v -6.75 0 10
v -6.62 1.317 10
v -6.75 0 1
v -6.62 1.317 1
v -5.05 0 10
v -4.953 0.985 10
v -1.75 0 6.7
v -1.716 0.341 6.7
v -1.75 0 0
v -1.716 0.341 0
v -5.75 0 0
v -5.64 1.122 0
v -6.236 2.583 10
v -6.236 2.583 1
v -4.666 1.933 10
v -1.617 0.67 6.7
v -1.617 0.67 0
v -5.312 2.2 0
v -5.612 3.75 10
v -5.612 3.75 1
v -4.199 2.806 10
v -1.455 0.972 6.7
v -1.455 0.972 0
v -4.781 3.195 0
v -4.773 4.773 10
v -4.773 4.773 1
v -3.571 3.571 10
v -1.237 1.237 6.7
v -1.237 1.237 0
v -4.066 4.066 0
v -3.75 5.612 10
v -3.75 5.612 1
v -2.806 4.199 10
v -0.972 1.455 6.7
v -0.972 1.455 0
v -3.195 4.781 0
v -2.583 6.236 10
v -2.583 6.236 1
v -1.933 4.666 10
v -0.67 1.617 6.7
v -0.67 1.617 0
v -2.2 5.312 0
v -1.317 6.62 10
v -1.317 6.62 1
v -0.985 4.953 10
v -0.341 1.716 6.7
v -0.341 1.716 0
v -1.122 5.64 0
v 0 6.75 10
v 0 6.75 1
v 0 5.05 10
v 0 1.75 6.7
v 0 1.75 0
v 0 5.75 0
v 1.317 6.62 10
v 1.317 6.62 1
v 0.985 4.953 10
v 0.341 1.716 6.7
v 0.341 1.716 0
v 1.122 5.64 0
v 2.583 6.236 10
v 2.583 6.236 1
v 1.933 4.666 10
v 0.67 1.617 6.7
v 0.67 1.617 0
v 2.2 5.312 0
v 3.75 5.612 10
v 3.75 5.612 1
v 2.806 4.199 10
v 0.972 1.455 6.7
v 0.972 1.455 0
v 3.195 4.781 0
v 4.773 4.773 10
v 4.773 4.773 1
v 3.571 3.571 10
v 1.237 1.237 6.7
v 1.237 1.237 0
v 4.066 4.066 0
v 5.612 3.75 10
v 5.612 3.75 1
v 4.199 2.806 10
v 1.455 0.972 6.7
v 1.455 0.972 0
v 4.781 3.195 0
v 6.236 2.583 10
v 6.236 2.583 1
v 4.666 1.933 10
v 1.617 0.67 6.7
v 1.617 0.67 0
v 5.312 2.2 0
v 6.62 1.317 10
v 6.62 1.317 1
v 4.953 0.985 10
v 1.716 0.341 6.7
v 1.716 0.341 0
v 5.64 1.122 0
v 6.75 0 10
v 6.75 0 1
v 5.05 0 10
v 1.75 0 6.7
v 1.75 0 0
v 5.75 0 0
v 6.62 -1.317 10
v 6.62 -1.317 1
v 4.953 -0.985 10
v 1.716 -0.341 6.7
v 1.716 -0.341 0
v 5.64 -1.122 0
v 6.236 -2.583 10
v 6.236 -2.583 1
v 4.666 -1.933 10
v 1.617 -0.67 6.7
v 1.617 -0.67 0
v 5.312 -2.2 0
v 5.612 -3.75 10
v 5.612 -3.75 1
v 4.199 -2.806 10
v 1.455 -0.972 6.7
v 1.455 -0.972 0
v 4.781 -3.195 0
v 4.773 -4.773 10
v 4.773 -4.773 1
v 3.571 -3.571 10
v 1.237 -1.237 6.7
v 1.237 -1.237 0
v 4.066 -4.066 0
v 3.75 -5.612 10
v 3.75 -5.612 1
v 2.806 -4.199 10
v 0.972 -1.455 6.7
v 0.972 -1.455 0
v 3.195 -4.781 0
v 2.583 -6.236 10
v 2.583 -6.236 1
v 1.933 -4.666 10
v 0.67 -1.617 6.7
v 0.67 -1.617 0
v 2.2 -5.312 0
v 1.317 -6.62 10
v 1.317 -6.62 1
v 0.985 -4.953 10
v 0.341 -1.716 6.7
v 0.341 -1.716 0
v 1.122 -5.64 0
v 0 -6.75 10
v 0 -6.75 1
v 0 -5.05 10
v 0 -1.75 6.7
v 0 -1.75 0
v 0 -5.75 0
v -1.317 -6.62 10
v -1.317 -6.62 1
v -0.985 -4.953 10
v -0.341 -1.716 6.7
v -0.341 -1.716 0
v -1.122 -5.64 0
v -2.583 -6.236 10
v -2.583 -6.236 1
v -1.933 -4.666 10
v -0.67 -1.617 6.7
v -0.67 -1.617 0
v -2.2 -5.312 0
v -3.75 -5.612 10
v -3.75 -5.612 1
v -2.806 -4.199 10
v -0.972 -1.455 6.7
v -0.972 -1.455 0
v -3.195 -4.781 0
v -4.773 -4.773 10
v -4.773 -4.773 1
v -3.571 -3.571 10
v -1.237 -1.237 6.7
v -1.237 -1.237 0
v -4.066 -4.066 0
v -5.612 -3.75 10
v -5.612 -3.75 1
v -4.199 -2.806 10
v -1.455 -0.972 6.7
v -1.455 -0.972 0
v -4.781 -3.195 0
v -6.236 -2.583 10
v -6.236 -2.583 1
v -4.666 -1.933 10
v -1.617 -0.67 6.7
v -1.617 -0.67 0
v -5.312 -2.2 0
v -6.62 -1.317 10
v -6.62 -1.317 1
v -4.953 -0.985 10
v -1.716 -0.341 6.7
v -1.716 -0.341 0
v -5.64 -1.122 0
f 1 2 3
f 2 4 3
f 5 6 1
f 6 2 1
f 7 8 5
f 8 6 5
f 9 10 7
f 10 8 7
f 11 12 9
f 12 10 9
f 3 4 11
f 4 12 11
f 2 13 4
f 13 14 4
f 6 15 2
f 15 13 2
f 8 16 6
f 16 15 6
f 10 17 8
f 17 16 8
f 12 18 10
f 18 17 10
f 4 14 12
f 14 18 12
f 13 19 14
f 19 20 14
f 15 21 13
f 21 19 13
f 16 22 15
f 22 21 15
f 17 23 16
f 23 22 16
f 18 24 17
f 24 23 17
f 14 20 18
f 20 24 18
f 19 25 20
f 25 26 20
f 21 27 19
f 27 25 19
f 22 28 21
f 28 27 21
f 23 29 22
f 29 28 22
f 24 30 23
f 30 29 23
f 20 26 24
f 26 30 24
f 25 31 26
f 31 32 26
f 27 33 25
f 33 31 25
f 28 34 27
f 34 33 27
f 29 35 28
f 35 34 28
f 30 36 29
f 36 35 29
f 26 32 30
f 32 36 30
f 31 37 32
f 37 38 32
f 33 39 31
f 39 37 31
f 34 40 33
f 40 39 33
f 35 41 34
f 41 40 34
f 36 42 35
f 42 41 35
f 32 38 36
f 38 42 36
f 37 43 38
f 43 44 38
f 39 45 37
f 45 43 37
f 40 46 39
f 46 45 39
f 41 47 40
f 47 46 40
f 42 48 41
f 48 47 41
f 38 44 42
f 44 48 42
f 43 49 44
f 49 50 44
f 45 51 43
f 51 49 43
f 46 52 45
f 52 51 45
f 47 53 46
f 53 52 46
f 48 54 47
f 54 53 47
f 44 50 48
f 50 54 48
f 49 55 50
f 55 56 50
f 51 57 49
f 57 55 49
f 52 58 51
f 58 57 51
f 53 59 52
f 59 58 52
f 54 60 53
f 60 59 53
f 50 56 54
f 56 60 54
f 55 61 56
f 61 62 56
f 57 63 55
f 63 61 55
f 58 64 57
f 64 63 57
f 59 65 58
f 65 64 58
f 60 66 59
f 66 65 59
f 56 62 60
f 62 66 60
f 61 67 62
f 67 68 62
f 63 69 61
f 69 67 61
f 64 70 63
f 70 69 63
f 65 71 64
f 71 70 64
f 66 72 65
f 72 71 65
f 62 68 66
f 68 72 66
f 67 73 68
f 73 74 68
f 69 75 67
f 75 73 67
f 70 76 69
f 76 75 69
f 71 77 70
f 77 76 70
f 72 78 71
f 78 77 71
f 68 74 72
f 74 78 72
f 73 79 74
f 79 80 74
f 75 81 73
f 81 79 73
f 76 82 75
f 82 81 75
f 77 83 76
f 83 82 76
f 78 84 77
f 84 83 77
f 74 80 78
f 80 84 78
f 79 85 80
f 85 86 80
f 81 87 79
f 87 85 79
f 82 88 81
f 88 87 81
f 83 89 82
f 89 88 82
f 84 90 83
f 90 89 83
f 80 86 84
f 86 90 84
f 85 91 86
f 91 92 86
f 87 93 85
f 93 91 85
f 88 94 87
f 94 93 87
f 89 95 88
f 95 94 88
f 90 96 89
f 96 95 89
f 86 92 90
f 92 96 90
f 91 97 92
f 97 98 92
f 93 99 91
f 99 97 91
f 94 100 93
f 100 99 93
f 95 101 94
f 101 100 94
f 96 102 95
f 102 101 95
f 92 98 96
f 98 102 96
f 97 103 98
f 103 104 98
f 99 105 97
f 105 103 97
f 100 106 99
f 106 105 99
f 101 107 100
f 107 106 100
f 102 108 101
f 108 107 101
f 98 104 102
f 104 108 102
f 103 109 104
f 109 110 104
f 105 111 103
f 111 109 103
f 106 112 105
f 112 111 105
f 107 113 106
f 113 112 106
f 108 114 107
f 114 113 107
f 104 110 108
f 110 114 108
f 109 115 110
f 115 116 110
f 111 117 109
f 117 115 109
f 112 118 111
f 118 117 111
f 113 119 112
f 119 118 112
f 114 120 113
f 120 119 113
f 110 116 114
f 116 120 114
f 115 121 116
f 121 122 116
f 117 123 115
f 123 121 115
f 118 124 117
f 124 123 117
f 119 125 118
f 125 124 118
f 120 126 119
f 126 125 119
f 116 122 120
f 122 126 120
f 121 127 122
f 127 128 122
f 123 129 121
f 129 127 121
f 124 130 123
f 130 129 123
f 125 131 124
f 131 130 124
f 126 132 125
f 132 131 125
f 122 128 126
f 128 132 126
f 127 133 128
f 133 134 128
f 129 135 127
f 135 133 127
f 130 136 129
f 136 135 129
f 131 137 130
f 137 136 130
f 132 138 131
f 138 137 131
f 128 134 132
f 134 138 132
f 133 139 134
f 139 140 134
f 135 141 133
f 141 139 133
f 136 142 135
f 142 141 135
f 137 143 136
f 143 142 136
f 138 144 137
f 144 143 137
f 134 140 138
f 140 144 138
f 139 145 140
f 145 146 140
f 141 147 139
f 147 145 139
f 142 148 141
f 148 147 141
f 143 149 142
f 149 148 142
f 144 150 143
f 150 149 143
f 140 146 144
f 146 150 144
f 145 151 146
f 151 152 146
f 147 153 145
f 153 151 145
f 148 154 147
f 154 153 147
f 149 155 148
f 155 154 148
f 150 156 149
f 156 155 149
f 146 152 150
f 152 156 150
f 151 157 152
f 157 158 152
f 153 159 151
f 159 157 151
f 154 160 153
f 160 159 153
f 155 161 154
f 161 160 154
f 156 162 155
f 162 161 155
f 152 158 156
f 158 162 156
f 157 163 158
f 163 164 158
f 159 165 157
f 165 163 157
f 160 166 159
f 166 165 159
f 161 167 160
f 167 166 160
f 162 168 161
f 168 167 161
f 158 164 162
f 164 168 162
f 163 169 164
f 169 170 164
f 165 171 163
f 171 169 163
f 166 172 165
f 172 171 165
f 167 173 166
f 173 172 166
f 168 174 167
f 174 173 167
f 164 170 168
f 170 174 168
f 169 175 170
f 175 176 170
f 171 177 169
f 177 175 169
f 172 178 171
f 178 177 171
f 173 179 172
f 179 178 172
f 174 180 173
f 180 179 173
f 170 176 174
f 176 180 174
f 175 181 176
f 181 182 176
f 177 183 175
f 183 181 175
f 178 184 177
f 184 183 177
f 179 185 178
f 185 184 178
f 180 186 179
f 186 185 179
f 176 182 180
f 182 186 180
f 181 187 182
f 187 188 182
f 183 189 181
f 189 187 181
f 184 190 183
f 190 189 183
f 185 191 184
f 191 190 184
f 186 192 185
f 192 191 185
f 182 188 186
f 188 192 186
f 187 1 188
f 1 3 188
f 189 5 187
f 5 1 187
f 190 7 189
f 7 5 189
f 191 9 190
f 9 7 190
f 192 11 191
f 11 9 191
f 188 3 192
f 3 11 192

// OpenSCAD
$fn = 32;

// ----------------------------------------------------------------------
// Form washer: countersunk washer, 13.5 mm outside, 3.5 mm bore
// ----------------------------------------------------------------------

// --- parameters (mm) ---
revolve_angle = 360;      // full turn around the Z axis
profile_points = 6;       // points of the closed outline

profile = [[1.75, 0], [5.75, 0], [6.75, 1], [6.75, 10], [5.05, 10], [1.75, 6.7]];  // single closed polygon, 6 points, counter clockwise

// --- the one profile operation ---
rotate_extrude(angle = revolve_angle) polygon(points = profile);
